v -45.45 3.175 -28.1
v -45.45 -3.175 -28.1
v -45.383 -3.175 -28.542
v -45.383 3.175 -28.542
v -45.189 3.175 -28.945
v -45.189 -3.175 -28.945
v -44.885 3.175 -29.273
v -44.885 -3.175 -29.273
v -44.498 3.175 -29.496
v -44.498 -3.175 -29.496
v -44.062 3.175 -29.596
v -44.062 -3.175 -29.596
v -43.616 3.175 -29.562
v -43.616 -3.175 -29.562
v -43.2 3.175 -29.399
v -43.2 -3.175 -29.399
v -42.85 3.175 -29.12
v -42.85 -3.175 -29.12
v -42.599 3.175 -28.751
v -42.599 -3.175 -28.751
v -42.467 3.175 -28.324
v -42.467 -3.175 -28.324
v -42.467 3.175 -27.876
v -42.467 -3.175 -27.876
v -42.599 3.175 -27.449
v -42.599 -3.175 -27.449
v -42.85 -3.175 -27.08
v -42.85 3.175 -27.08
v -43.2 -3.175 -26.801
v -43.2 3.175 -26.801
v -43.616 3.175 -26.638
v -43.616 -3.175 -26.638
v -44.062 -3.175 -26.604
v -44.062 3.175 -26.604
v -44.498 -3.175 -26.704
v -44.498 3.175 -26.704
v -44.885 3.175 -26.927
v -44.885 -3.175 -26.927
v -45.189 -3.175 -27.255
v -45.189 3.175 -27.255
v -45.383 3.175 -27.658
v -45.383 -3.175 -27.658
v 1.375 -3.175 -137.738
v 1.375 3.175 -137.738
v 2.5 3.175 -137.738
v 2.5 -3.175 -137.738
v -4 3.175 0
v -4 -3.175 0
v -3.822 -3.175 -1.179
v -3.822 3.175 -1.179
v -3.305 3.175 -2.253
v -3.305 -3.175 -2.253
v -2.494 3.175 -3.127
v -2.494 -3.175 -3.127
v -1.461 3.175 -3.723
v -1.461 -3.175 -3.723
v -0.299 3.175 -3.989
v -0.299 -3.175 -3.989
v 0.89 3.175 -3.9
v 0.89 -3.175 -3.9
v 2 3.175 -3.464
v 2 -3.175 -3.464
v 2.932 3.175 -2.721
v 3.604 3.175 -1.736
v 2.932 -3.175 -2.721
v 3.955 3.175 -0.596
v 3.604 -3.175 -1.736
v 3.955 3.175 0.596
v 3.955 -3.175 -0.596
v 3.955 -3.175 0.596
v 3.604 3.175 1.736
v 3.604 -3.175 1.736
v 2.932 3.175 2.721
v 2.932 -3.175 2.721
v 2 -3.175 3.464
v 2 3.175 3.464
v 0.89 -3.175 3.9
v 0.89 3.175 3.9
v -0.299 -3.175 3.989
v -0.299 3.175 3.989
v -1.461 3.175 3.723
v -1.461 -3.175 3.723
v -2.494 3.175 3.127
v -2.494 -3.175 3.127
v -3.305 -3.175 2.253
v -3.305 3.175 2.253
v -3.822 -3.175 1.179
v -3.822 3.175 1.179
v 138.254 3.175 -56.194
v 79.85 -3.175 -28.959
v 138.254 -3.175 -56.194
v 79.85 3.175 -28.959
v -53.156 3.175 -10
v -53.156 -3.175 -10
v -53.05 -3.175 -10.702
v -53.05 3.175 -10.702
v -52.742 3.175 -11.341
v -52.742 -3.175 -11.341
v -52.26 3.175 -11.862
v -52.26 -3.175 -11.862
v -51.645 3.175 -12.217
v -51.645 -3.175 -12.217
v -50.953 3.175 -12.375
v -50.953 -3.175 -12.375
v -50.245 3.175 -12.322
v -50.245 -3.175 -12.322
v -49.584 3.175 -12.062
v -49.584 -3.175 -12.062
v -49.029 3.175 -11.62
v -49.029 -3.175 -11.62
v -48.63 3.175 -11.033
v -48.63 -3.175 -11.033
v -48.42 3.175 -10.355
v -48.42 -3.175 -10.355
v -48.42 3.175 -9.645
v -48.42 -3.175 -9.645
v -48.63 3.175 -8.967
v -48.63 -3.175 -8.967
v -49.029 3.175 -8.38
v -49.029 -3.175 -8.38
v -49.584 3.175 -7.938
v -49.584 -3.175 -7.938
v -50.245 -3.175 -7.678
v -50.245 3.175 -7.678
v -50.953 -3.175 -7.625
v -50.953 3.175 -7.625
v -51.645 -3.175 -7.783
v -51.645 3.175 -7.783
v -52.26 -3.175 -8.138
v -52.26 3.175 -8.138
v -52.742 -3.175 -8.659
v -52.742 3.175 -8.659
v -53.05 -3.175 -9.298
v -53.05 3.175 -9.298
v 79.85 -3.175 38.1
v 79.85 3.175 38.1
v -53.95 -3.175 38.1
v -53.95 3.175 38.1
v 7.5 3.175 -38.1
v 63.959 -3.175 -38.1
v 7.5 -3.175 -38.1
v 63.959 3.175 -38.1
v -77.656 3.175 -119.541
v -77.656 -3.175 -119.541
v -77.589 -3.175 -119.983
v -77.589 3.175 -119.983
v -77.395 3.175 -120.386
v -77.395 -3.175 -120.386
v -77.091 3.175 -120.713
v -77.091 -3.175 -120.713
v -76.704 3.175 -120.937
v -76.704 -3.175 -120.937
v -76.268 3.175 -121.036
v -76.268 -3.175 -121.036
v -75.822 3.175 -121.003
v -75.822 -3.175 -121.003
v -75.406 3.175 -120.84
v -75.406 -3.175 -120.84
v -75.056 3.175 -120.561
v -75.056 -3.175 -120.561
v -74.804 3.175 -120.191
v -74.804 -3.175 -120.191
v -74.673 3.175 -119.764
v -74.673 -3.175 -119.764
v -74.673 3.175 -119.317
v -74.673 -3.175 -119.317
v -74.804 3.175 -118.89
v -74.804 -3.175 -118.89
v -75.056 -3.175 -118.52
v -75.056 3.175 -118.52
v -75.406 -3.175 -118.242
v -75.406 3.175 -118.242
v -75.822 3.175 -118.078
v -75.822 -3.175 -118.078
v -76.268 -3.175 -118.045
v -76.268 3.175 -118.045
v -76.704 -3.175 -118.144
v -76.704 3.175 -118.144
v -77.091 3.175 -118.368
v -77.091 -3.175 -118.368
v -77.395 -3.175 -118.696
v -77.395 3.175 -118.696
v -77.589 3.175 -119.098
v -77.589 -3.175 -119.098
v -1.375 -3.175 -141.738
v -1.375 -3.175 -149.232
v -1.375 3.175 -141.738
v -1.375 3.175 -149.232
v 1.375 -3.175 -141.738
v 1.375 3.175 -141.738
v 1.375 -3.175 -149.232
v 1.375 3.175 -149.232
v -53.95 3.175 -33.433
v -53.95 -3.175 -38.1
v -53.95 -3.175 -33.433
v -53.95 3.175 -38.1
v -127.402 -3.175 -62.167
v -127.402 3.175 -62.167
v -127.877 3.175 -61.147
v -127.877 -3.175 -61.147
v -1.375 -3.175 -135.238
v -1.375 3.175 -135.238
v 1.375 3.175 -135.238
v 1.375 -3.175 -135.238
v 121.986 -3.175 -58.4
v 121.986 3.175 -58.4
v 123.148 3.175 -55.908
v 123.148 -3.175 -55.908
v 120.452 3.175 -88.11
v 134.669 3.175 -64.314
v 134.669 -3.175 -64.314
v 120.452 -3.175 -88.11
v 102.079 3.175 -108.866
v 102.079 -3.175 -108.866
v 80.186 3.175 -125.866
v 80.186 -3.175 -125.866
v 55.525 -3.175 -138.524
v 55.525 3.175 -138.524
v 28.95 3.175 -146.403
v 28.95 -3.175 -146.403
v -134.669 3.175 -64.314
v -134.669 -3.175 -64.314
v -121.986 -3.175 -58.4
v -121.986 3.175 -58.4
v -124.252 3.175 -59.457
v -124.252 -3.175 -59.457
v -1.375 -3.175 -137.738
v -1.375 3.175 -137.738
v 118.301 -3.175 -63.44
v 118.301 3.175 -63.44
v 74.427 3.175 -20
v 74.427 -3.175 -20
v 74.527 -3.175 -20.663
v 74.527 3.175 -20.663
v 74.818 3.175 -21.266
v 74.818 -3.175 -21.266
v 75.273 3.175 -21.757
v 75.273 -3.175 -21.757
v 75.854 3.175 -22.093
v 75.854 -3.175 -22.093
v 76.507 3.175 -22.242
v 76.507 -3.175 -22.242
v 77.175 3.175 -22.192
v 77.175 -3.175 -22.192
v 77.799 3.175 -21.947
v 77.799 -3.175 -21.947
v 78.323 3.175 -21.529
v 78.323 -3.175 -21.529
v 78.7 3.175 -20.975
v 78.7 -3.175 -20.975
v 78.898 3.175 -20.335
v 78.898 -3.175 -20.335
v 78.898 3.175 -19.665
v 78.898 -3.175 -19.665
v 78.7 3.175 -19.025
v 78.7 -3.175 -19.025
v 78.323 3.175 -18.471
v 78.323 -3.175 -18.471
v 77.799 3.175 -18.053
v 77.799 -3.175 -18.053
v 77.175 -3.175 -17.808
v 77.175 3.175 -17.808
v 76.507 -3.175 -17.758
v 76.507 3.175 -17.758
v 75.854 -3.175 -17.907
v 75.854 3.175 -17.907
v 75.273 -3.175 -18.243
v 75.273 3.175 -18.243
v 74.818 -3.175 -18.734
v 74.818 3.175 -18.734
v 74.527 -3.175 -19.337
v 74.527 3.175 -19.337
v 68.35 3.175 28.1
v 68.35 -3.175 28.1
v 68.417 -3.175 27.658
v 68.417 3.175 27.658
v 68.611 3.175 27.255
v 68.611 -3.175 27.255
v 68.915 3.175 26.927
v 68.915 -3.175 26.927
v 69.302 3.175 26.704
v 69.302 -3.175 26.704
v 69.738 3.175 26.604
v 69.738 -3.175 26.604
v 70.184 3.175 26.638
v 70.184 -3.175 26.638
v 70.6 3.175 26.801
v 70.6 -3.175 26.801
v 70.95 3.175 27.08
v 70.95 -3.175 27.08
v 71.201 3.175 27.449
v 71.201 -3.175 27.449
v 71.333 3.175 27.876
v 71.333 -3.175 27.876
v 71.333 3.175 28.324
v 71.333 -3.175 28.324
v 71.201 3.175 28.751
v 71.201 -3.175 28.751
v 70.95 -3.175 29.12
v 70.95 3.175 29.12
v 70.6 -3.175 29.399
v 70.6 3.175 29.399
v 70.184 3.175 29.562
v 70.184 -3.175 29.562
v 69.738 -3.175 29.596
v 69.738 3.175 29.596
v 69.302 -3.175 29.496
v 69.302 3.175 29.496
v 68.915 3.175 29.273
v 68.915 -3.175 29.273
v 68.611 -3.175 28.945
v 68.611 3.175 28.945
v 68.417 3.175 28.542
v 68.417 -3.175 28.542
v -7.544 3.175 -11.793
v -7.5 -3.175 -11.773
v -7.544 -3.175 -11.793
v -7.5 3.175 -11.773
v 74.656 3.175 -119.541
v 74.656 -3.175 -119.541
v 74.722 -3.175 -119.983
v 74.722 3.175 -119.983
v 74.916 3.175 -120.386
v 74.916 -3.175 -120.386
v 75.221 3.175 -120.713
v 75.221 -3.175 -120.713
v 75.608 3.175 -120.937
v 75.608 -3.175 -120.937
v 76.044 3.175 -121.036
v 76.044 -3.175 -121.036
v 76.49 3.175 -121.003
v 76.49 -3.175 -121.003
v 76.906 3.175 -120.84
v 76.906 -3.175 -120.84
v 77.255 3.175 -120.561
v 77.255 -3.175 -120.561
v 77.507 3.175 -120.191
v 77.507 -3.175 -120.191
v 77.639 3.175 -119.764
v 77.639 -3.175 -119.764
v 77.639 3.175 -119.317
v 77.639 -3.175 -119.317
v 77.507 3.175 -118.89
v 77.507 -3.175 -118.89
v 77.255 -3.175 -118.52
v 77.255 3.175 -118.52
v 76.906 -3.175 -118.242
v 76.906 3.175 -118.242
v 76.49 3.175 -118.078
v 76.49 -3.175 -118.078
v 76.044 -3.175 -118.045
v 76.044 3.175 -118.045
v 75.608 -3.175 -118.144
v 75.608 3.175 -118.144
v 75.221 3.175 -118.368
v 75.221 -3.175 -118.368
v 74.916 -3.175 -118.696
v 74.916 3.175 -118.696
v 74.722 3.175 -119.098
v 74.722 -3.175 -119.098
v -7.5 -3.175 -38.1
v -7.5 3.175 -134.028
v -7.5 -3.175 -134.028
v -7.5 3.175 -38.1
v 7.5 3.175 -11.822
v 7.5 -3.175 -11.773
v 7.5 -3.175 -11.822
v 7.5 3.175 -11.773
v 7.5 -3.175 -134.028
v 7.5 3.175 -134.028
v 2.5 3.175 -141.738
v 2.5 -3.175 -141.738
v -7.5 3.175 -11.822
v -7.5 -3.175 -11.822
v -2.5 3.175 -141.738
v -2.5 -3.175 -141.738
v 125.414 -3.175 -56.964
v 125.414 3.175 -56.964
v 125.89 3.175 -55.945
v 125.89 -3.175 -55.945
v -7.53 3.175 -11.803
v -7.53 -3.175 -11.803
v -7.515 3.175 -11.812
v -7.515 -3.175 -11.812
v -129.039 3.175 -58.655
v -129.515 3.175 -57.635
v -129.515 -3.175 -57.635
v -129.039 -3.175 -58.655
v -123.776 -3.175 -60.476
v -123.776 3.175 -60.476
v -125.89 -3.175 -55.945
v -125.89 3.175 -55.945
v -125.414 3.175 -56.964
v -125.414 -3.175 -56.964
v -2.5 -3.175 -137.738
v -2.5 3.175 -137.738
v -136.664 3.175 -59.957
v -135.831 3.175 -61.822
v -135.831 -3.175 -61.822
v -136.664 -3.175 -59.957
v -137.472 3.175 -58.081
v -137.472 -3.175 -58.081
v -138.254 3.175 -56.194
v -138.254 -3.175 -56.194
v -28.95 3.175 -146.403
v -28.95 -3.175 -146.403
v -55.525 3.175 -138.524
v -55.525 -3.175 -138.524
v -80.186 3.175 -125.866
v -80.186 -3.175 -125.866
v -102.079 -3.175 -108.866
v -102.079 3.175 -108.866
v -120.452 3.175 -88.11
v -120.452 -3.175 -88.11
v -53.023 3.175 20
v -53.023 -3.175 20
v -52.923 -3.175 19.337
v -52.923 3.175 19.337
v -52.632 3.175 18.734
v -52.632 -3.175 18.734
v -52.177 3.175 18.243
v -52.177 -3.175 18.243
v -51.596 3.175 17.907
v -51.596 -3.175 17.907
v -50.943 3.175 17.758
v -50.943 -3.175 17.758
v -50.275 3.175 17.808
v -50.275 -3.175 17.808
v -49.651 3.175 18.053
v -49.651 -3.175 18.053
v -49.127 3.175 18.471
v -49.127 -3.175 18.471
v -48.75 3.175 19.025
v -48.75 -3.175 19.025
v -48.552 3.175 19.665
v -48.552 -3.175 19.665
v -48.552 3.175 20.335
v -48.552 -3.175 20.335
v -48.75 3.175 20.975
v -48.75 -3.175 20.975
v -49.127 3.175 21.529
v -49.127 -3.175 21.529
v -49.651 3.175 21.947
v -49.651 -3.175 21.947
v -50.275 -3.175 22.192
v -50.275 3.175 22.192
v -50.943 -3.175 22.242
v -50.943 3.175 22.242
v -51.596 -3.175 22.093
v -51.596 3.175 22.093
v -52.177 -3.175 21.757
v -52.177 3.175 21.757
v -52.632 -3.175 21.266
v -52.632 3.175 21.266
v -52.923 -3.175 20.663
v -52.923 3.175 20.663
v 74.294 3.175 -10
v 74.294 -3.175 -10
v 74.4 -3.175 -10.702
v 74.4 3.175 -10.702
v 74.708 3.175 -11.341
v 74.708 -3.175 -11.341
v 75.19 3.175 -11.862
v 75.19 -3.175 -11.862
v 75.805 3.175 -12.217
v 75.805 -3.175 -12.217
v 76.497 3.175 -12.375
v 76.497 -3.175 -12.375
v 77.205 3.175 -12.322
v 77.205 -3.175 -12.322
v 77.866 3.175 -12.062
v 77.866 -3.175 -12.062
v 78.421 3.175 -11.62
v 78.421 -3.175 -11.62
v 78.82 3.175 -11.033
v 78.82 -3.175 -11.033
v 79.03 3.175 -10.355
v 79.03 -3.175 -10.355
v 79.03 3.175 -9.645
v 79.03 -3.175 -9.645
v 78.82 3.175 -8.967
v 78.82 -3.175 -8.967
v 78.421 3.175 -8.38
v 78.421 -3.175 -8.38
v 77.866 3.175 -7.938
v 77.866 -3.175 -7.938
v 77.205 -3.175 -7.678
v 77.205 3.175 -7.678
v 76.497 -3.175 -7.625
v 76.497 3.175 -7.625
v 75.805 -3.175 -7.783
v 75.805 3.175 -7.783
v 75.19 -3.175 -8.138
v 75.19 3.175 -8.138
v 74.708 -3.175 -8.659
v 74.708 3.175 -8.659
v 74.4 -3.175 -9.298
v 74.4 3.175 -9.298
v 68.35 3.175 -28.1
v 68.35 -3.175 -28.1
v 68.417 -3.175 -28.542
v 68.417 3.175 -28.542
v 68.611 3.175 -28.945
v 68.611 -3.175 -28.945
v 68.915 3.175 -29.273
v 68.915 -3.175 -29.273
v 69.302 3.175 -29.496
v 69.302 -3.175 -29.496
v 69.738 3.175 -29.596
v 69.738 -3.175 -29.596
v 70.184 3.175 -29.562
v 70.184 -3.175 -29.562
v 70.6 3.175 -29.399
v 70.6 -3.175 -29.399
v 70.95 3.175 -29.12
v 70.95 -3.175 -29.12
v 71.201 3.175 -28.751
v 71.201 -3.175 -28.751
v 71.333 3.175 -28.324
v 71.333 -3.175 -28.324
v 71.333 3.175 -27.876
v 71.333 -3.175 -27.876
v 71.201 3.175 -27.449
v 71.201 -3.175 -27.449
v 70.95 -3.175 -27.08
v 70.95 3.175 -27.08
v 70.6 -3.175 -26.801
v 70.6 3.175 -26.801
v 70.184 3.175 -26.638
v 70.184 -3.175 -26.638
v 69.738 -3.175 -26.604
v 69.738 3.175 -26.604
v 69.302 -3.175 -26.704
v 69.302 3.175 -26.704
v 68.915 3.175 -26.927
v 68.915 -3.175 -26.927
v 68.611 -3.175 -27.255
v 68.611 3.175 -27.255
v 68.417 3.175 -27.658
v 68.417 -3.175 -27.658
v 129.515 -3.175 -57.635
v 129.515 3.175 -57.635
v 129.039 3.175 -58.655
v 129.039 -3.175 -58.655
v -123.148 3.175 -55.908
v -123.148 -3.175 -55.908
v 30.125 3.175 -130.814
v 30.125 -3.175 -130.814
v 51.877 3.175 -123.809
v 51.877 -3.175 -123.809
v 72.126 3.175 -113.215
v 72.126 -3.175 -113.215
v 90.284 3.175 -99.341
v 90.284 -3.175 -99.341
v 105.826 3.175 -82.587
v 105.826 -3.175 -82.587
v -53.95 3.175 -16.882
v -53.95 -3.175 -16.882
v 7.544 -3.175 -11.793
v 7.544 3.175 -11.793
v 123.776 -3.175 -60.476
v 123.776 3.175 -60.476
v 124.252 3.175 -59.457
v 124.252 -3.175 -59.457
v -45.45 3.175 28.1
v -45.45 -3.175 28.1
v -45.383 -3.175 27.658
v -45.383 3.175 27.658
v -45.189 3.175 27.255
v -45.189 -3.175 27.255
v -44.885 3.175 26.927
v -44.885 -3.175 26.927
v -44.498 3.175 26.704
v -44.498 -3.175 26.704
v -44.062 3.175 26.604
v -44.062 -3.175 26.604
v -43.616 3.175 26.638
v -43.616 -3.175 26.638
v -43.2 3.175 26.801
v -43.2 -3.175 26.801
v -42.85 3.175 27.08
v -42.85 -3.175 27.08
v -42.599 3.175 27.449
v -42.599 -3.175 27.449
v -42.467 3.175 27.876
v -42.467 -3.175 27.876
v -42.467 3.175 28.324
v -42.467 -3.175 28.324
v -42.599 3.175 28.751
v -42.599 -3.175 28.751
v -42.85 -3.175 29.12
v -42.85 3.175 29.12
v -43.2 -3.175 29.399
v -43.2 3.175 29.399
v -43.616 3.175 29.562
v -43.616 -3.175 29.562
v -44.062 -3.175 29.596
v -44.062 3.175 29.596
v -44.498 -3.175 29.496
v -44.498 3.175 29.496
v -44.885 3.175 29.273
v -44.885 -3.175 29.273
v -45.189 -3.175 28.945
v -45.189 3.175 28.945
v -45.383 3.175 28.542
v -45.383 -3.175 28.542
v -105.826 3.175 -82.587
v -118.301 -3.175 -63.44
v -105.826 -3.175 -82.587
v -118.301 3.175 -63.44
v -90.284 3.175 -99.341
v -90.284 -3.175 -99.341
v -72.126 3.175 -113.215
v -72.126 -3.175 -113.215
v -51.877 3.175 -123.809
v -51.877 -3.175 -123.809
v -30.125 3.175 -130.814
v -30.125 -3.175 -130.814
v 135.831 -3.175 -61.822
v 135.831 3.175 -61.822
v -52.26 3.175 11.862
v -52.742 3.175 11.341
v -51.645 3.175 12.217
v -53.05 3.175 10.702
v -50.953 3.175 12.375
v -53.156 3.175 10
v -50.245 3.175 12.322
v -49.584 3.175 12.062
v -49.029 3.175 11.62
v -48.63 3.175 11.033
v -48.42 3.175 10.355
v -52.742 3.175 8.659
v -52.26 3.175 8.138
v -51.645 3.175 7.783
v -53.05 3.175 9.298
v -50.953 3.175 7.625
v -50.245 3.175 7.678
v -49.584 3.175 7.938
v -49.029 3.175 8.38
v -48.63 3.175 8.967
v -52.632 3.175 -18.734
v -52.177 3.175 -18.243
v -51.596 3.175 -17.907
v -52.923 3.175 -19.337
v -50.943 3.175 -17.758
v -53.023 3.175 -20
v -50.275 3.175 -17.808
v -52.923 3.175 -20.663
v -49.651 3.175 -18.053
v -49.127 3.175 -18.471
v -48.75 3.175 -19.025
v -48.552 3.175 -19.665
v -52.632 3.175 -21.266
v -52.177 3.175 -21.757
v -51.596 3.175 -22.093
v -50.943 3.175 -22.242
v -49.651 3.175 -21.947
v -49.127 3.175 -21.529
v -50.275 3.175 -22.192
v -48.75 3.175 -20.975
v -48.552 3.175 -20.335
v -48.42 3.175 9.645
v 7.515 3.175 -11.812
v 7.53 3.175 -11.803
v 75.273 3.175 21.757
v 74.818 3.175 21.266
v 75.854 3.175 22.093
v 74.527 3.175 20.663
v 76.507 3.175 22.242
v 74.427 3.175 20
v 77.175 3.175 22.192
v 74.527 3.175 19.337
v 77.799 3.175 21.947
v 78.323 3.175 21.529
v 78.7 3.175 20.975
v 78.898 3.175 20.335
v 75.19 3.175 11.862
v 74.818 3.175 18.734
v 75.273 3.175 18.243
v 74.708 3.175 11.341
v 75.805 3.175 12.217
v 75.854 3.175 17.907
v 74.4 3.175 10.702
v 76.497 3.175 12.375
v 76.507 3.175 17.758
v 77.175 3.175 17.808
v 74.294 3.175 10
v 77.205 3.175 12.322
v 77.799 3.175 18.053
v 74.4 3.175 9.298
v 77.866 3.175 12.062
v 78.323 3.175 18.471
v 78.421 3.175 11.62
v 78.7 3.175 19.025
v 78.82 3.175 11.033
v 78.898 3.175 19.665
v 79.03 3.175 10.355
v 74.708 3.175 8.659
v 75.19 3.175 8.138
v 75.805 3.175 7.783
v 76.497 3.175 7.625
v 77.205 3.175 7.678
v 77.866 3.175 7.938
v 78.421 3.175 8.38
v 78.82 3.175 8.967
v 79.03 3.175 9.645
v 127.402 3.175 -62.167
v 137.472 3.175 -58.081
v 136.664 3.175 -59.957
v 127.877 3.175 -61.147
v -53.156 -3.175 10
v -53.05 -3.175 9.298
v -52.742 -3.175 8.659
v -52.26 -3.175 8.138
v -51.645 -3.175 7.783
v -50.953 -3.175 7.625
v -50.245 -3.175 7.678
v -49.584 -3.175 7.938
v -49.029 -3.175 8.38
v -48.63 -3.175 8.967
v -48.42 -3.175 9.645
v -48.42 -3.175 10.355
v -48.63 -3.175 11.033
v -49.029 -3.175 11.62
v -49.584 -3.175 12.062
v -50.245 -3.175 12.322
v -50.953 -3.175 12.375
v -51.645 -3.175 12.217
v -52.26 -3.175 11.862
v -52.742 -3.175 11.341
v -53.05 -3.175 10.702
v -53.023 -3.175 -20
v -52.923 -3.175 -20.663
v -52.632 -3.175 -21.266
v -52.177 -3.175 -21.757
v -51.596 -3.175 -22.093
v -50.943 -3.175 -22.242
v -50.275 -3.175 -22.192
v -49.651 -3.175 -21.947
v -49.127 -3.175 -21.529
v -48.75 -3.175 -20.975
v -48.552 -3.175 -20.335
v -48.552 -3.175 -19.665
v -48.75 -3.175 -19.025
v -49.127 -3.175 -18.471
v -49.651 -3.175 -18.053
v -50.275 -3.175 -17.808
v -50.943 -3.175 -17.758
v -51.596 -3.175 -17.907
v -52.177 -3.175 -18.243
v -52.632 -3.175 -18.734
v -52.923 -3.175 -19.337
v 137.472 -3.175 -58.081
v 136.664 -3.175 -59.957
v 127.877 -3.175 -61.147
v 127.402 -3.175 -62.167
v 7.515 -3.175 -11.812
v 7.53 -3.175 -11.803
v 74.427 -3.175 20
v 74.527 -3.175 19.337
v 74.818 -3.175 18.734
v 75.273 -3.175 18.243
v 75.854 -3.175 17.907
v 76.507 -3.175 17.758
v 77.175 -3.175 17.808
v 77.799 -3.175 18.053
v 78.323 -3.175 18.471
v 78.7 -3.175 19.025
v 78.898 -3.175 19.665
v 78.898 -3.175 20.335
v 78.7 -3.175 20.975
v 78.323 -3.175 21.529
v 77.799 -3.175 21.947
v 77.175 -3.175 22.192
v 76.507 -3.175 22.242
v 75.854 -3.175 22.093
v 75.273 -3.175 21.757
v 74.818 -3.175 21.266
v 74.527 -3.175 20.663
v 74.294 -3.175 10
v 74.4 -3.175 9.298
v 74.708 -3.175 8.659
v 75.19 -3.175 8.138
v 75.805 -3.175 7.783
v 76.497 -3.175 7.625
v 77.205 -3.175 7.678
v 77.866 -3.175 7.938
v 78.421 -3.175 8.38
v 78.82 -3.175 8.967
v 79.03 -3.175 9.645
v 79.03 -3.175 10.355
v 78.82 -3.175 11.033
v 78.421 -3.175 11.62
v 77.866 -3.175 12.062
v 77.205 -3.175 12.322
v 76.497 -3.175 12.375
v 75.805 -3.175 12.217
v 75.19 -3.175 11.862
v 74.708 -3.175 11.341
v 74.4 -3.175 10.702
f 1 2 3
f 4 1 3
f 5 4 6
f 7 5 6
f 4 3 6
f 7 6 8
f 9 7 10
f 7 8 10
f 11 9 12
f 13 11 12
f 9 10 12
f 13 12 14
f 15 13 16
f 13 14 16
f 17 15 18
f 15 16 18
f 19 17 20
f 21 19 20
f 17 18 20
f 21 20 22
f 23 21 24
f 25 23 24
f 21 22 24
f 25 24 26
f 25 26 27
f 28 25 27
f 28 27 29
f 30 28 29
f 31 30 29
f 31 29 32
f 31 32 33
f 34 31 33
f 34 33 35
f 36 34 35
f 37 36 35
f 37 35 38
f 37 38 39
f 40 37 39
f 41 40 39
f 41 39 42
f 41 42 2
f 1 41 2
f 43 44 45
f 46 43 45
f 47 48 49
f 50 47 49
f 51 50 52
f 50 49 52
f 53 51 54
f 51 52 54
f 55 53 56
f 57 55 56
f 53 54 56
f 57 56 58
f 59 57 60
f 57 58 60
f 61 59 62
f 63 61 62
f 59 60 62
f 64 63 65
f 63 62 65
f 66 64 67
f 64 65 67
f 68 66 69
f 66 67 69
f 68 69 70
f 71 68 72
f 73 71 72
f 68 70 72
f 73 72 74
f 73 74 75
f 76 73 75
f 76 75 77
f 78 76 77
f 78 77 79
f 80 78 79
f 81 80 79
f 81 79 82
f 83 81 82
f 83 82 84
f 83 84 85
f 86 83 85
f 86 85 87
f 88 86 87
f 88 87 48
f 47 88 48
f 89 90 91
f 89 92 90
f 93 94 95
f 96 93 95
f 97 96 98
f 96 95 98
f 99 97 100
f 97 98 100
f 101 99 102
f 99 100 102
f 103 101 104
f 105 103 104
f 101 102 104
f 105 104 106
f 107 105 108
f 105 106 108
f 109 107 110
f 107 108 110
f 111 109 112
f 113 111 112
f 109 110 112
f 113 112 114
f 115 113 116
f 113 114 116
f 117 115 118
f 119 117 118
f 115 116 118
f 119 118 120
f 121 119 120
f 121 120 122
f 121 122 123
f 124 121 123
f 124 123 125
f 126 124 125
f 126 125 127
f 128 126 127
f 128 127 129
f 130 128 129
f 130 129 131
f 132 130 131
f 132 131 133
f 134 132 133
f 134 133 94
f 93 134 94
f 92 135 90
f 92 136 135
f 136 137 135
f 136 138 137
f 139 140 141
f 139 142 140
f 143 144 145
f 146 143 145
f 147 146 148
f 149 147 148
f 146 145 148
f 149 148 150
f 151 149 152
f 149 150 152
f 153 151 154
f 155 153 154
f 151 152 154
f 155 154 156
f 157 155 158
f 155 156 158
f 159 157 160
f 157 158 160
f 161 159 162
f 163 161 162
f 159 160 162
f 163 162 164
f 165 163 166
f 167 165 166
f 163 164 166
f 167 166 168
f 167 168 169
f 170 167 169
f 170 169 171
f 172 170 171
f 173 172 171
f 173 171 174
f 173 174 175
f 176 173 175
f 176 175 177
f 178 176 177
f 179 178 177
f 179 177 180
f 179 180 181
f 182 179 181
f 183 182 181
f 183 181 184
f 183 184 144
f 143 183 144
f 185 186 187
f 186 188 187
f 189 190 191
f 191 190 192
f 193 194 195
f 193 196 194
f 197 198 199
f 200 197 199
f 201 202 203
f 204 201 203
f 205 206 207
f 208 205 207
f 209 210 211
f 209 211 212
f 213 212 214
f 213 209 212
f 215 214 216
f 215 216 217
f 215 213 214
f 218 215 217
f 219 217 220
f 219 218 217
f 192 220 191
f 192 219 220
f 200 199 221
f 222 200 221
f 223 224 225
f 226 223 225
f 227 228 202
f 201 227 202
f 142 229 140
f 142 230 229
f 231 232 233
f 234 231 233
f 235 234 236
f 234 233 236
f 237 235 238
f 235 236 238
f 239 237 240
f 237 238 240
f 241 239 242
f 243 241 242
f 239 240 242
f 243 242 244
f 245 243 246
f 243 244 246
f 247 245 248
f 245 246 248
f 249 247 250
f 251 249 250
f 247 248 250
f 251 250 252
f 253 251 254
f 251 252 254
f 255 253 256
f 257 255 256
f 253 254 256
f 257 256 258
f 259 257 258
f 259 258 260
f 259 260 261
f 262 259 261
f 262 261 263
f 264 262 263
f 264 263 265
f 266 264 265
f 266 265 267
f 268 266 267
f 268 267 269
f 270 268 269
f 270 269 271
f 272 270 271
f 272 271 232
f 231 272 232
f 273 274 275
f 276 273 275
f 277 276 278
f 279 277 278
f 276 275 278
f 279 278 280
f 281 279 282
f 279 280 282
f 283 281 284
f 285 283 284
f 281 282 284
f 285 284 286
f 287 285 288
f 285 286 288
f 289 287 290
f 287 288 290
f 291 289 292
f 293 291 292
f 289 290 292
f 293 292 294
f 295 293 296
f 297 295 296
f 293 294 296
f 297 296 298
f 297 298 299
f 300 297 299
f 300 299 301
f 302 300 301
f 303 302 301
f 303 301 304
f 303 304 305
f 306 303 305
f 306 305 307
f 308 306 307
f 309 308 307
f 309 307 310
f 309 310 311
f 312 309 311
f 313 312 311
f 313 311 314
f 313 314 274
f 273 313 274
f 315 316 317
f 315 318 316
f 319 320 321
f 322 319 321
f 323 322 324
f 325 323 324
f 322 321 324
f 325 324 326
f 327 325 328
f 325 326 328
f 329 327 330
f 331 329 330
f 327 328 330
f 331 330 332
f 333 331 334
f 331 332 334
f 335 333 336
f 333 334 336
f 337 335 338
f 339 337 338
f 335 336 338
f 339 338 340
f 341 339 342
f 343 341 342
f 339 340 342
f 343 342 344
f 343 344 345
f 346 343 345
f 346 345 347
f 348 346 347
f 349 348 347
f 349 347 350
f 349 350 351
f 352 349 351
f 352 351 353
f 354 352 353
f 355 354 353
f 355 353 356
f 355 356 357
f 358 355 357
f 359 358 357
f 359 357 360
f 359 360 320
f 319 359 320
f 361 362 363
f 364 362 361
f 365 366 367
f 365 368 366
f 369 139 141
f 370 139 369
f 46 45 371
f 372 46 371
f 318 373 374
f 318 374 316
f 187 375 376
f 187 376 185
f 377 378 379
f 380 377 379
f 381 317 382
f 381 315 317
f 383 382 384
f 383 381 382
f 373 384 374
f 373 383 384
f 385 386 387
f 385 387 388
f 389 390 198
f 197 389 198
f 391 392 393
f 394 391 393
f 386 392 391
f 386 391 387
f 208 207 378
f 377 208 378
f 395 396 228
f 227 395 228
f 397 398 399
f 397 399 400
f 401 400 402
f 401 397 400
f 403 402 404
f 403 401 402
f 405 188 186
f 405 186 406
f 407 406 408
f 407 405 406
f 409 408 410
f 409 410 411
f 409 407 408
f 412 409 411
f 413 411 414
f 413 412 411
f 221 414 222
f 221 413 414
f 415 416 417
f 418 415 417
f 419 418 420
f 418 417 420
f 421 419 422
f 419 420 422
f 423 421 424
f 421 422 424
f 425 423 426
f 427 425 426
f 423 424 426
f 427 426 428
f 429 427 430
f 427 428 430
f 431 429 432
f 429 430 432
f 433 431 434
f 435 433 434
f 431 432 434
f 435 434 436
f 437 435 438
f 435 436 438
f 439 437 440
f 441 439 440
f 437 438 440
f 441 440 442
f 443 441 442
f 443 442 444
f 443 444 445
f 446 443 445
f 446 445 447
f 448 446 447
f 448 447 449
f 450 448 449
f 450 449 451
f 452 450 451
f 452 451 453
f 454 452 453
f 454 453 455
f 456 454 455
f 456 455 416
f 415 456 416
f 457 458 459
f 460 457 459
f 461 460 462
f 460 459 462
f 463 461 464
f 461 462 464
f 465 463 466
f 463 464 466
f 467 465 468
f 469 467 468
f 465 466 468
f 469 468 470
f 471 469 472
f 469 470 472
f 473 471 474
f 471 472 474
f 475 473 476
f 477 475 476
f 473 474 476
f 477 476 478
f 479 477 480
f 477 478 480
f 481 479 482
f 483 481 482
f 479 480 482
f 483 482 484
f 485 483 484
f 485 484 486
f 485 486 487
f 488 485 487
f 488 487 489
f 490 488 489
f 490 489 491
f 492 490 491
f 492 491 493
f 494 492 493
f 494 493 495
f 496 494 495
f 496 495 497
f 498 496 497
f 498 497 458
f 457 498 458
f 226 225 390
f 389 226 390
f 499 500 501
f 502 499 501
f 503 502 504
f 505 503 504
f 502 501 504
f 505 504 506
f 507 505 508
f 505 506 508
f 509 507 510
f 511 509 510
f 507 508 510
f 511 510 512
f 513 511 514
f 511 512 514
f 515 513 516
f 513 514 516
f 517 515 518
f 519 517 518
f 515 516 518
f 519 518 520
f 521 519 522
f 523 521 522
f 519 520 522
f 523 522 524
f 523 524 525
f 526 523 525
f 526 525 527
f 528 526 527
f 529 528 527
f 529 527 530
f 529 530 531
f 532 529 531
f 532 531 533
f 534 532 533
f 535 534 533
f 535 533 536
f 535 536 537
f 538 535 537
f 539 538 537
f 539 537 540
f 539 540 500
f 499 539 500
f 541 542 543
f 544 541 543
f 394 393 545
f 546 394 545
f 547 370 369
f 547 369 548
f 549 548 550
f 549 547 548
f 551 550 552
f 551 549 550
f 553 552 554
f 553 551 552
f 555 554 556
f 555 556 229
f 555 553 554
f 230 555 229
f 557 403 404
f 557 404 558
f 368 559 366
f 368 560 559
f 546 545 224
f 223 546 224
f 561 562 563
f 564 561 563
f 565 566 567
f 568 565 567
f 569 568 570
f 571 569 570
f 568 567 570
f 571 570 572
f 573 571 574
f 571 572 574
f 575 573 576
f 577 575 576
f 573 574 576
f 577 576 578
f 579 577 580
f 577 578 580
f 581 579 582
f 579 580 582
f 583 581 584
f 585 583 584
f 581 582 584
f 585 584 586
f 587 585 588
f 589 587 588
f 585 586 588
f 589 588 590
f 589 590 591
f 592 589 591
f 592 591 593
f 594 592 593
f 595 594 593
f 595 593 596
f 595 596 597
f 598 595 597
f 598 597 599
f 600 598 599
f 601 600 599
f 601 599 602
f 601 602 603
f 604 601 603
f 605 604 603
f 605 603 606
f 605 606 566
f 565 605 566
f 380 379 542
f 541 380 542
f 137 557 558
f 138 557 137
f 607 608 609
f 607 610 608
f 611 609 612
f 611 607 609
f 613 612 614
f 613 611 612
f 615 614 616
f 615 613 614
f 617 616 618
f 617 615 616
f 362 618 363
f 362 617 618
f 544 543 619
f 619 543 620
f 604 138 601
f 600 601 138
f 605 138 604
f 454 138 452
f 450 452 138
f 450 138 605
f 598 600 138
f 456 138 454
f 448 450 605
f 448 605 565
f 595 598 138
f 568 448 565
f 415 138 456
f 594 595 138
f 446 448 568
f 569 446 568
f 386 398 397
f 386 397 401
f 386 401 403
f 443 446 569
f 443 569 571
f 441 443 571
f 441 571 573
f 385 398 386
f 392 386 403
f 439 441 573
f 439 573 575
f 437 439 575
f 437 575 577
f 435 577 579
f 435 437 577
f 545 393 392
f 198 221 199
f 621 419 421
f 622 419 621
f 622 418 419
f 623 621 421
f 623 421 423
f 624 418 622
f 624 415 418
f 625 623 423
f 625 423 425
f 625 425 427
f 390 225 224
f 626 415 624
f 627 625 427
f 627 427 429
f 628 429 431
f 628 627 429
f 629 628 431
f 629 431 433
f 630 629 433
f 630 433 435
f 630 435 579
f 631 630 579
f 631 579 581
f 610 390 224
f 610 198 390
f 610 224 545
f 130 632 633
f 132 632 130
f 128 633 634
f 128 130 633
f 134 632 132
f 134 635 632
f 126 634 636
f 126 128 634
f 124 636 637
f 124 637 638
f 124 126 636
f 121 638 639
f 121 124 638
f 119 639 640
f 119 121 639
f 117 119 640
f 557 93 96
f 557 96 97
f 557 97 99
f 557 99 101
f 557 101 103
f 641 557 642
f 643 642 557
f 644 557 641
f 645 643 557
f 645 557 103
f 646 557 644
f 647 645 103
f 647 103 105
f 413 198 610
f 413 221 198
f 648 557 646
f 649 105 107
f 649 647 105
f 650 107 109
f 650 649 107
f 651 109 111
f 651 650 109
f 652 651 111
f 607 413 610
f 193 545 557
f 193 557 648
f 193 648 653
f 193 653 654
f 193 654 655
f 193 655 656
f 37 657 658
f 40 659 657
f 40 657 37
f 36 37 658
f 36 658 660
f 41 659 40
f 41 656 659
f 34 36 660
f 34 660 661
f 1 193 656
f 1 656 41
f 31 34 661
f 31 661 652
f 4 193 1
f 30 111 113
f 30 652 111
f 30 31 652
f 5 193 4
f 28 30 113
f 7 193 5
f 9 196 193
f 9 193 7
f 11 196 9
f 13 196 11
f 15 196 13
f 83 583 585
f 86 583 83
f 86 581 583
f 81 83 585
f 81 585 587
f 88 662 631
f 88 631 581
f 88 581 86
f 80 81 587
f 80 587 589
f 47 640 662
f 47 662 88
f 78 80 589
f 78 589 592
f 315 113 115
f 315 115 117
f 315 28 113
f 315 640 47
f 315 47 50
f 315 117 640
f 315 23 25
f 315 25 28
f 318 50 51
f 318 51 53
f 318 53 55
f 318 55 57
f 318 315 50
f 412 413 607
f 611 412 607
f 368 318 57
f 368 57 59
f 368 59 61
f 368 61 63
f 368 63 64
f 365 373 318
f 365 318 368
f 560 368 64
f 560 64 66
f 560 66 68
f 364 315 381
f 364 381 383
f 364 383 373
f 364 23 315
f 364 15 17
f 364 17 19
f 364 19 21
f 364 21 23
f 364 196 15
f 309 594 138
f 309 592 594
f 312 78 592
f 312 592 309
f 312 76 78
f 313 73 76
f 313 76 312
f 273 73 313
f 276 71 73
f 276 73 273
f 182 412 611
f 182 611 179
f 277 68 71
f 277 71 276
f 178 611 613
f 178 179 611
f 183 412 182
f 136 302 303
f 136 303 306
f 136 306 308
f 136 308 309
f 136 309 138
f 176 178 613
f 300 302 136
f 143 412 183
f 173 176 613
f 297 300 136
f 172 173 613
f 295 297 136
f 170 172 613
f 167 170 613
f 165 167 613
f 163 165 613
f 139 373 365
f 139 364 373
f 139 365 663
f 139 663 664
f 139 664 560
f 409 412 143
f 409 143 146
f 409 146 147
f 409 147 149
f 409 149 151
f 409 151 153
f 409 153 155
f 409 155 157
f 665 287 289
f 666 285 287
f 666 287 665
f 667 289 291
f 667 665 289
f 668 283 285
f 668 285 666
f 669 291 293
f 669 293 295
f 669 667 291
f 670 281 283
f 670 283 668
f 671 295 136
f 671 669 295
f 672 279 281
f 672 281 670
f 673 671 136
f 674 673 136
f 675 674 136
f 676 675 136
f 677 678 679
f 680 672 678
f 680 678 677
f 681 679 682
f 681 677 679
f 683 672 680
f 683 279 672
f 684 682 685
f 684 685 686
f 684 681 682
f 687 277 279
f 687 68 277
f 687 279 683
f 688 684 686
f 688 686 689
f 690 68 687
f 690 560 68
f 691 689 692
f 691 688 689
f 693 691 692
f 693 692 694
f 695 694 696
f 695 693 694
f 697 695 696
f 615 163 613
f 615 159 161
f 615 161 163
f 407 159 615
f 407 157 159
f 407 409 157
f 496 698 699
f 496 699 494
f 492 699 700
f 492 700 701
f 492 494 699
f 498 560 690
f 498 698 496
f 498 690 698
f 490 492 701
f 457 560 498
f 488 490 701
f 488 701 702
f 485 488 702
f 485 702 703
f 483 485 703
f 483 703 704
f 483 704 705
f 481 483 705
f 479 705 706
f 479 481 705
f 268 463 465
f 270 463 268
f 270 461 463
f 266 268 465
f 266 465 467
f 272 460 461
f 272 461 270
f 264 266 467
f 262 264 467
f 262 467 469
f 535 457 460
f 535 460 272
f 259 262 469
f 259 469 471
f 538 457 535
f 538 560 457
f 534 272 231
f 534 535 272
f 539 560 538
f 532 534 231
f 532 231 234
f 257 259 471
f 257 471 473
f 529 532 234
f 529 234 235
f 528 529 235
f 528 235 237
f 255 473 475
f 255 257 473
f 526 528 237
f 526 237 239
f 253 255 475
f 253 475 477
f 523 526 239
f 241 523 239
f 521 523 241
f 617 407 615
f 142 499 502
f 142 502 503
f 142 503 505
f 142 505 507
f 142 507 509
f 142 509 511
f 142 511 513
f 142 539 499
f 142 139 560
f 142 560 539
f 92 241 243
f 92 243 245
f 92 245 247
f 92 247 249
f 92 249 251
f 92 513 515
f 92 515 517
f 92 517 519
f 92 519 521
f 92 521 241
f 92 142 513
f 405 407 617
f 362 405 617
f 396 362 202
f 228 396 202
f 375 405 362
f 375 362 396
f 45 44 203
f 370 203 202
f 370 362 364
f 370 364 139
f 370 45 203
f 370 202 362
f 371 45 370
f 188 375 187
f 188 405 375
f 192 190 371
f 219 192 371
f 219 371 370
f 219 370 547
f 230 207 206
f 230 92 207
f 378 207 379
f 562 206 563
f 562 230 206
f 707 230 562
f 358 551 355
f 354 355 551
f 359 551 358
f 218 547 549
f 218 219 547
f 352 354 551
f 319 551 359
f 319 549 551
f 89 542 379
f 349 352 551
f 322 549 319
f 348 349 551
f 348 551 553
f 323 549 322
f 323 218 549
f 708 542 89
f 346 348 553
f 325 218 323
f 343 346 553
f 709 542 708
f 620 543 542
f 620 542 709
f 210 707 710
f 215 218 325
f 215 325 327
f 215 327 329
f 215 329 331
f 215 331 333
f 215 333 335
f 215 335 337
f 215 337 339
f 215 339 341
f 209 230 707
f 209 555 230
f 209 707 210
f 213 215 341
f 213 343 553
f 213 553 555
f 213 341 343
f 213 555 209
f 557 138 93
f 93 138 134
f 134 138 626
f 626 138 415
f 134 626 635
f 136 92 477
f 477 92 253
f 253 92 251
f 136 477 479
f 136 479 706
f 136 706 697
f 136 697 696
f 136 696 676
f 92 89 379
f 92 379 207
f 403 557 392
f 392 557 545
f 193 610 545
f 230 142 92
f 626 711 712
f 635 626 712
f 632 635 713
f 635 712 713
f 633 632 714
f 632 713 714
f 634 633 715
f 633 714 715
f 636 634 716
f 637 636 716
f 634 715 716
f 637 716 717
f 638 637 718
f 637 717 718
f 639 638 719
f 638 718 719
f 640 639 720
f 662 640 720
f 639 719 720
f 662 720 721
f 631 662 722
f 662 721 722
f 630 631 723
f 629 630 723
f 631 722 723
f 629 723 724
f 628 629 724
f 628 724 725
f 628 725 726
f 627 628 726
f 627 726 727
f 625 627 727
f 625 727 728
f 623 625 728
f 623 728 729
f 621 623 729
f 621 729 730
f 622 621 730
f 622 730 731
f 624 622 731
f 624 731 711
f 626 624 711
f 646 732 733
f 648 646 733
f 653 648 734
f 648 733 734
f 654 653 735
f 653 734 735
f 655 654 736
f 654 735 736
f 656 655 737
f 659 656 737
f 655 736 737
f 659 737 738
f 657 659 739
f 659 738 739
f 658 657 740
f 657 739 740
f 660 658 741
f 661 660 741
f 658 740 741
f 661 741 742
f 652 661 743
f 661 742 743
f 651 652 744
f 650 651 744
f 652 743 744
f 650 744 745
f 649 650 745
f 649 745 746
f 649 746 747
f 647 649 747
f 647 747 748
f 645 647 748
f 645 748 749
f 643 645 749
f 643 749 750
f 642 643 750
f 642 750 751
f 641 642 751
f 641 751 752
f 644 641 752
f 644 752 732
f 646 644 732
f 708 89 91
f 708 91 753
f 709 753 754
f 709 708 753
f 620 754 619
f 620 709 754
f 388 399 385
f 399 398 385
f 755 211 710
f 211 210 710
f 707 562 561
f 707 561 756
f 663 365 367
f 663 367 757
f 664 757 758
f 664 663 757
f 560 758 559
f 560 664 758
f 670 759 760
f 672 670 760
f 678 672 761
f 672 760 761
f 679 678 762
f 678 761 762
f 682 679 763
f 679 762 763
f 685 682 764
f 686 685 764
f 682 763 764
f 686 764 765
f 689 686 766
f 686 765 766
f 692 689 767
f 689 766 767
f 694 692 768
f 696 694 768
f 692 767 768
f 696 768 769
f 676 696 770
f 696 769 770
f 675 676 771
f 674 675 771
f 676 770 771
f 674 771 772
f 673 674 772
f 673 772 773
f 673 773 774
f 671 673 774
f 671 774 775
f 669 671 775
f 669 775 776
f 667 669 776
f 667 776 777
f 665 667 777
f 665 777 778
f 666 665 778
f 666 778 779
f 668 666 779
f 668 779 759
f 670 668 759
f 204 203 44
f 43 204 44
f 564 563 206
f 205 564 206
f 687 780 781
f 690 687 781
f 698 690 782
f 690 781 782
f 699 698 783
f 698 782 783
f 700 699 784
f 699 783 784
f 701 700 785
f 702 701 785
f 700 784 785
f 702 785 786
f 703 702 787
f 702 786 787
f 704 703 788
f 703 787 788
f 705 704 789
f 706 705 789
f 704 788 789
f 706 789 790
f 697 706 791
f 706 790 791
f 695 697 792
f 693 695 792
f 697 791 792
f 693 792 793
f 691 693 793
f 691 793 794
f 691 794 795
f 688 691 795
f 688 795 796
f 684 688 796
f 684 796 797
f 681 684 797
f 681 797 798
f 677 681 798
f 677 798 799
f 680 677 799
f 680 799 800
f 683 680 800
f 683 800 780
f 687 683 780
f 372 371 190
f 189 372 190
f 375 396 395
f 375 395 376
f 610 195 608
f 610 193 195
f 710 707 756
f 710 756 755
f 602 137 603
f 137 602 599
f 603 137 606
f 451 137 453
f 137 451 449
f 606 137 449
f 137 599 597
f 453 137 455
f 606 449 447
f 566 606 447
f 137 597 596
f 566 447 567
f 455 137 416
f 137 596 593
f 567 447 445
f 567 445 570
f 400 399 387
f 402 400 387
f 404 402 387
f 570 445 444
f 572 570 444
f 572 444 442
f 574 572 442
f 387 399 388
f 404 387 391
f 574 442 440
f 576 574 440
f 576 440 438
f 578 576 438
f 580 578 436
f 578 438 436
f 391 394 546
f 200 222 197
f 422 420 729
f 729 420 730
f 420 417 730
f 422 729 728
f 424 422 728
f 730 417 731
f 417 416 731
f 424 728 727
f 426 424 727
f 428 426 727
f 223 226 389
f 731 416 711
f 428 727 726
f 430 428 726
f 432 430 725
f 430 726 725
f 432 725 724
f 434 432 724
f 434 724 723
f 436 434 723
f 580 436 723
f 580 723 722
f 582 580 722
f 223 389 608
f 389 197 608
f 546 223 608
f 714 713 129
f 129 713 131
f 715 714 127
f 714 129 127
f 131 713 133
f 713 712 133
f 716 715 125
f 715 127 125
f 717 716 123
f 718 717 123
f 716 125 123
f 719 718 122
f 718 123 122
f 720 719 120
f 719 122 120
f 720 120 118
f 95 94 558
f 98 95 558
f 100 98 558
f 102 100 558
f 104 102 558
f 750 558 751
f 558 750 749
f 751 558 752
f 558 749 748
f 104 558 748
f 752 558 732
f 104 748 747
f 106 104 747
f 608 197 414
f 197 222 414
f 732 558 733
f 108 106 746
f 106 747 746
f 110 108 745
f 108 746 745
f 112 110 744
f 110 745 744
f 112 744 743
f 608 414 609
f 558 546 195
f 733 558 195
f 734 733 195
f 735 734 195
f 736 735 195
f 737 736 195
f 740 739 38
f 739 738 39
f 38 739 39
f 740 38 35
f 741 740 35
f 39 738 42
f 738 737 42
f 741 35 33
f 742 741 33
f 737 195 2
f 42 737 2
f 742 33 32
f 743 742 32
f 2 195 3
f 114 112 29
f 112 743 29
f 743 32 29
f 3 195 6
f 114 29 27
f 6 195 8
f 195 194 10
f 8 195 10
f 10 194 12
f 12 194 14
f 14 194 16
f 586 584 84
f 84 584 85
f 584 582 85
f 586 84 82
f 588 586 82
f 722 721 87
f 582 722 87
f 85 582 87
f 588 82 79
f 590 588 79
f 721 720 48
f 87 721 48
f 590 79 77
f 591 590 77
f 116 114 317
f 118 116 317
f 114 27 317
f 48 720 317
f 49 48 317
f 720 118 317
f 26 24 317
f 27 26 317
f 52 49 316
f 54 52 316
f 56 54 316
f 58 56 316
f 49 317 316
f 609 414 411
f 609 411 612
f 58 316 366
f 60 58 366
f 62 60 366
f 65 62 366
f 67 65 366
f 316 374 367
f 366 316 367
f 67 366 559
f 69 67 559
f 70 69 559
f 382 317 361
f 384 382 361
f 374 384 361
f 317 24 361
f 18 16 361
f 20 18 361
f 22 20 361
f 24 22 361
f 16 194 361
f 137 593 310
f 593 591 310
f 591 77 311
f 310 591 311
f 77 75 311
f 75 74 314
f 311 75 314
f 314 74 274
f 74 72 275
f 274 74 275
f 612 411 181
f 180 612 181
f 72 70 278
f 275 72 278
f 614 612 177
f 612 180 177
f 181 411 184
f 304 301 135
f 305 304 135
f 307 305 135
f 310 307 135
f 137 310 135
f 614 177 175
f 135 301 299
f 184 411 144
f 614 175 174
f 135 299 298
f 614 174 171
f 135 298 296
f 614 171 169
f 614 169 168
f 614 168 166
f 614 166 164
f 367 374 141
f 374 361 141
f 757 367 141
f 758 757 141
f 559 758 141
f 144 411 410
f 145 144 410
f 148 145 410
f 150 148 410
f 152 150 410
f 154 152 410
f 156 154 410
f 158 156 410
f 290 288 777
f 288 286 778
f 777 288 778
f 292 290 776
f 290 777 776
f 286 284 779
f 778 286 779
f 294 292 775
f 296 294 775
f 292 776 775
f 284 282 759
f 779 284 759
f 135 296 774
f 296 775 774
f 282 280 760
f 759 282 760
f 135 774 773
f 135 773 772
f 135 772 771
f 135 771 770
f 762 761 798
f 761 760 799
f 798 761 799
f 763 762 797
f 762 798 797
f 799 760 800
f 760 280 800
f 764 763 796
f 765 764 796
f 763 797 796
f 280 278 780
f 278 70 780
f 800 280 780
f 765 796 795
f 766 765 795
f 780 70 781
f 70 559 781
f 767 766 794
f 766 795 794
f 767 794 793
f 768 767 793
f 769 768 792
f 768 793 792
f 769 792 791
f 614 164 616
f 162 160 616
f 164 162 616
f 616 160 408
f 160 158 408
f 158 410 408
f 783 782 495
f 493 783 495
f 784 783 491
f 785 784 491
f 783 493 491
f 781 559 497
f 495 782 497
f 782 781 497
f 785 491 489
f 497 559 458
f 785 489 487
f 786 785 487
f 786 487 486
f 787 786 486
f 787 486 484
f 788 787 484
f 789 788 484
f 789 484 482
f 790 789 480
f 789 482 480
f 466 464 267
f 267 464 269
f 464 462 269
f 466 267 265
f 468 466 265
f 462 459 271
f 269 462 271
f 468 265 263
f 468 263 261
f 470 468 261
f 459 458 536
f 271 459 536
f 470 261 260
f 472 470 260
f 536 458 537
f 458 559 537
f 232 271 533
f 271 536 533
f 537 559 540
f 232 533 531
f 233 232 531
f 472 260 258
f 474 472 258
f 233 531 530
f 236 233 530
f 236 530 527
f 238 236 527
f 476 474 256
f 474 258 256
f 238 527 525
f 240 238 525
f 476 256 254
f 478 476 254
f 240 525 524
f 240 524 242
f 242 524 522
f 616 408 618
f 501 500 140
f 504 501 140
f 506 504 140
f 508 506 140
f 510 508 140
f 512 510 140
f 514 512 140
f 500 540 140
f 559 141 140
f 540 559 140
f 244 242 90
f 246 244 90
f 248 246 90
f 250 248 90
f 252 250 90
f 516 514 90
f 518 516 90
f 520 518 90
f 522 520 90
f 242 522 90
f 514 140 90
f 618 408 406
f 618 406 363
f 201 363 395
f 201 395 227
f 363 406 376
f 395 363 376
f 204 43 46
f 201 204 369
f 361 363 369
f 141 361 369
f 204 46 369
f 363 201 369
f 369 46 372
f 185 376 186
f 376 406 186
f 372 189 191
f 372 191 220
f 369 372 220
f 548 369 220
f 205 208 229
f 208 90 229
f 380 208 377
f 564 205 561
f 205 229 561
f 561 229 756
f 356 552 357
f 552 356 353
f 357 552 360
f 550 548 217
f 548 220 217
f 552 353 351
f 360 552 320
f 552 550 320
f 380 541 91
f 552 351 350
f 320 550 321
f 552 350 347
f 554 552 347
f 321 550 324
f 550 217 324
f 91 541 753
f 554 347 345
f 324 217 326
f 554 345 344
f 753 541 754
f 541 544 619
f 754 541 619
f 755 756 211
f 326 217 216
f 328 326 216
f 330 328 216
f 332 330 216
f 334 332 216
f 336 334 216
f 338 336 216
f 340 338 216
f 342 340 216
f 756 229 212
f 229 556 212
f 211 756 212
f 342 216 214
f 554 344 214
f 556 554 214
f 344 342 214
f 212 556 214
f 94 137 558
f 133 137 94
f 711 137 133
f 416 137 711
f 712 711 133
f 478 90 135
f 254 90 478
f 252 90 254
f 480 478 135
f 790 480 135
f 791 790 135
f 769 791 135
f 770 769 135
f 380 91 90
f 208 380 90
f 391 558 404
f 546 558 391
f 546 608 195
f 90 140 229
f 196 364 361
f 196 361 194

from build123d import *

# Parameters (mm, degrees)
BOSS_EXTRUDE1_DEPTH             = 3.175
SKETCH2_W                       = 2.75
SKETCH2_H                       = 2.5
SKETCH2_H_2                     = 4
SKETCH2_W_2                     = 1.125
SKETCH2_H_3                     = 7.5
CUT_EXTRUDE1_DEPTH              = 204.460831631
CIRPATTERN1_COUNT               = 2
CIRPATTERN1_ANGLE               = 65
CIRPATTERN1_THE_OTHER_WAY_COUNT = 2
CIRPATTERN1_THE_OTHER_WAY_ANGLE = 65
F_3_0_3_DIAMETER_HOLE1_D        = 3
F_8_0_8_DIAMETER_HOLE1_D        = 8
F_8_0_8_DIAMETER_HOLE1_DEPTH    = 6.35
F_8_CLEARANCE_HOLE1_D           = 4.4958
F_8_CLEARANCE_HOLE1_DEPTH       = 12.83
F_8_CLEARANCE_HOLE1_TIP         = 1.350674586
F_3_16_0_1875_DOWEL_HOLE1_D     = 4.7625
F_3_16_0_1875_DOWEL_HOLE1_DEPTH = 12.83
F_3_16_0_1875_DOWEL_HOLE1_TIP   = 1.430799349


with BuildPart() as part:
    # Sketch1 → Boss-Extrude1 (new, symmetric)
    with BuildSketch(Plane(origin=(0, 0, 0), x_dir=(1, 0, 0), z_dir=(0, 1, 0))):
        with BuildLine():
            Line((79.85, 28.959332111), (138.254290129, 56.193699868))
            ThreePointArc((138.254290129, 56.193699868), (0, 149.238), (-138.254290129, 56.193699868))
            Line((-138.254290129, 56.193699868), (-53.95, 16.881963765))
            Line((-53.95, 16.881963765), (-53.95, -38.1))
            Line((-53.95, -38.1), (79.85, -38.1))
            Line((79.85, -38.1), (79.85, 28.959332111))
        make_face()
        with BuildLine():
            Line((-7.5, 11.821590418), (-7.5, 11.772641828))
            Line((-7.5, 11.772641828), (-7.544362488, 11.793328396))
            ThreePointArc((-7.544362488, 11.793328396), (-7.522194517, 11.807480241), (-7.5, 11.821590418))
        make_face(mode=Mode.SUBTRACT)
        with BuildLine():
            ThreePointArc((7.5, 11.821590418), (7.522194517, 11.807480241), (7.544362488, 11.793328396))
            Line((7.544362488, 11.793328396), (7.5, 11.772641828))
            Line((7.5, 11.772641828), (7.5, 11.821590418))
        make_face(mode=Mode.SUBTRACT)
        with BuildLine():
            Line((-7.5, 134.028320306), (-7.5, 38.1))
            Line((-7.5, 38.1), (-53.95, 38.1))
            Line((-53.95, 38.1), (-53.95, 33.43263255))
            Line((-53.95, 33.43263255), (-118.301273414, 63.440124154))
            ThreePointArc((-118.301273414, 63.440124154), (-72.126024825, 113.215180903), (-7.5, 134.028320306))
        make_face(mode=Mode.SUBTRACT)
        with BuildLine():
            ThreePointArc((7.5, 134.028320306), (72.126024825, 113.215180903), (118.301273414, 63.440124154))
            Line((118.301273414, 63.440124154), (63.959201798, 38.1))
            Line((63.959201798, 38.1), (7.5, 38.1))
            Line((7.5, 38.1), (7.5, 134.028320306))
        make_face(mode=Mode.SUBTRACT)
    extrude(amount=BOSS_EXTRUDE1_DEPTH, both=True)

    # Sketch2 → Cut-Extrude1 (cut, symmetric)
    with BuildSketch(Plane(origin=(0, 0, 0), x_dir=(1, 0, 0), z_dir=(0, 1, 0))):
        with Locations((0, 136.488)):
            Rectangle(SKETCH2_W, SKETCH2_H)
        with Locations((0, 139.738)):
            Rectangle(SKETCH2_W, SKETCH2_H_2)
        with Locations((1.9375, 139.738)):
            Rectangle(SKETCH2_W_2, SKETCH2_H_2)
        with Locations((0, 145.488)):
            Rectangle(SKETCH2_W, SKETCH2_H_3)
        with Locations((-1.9375, 139.738)):
            Rectangle(SKETCH2_W_2, SKETCH2_H_2)
    cut_extrude1 = extrude(amount=CUT_EXTRUDE1_DEPTH, both=True, mode=Mode.SUBTRACT)

    # CirPattern1: Cut-Extrude1 ×2 about axis
    cirpattern1_axis = Axis((0, 0, 0), (0, 1, 0))
    for i in range(1, CIRPATTERN1_COUNT):
        add(cut_extrude1.rotate(cirpattern1_axis, i * CIRPATTERN1_ANGLE / (CIRPATTERN1_COUNT - 1)), mode=Mode.SUBTRACT)

    # CirPattern1 the other way: Cut-Extrude1 ×2 about axis
    cirpattern1_the_other_way_axis = Axis((0, 0, 0), (0, -1, 0))
    for i in range(1, CIRPATTERN1_THE_OTHER_WAY_COUNT):
        add(cut_extrude1.rotate(cirpattern1_the_other_way_axis, i * CIRPATTERN1_THE_OTHER_WAY_ANGLE / (CIRPATTERN1_THE_OTHER_WAY_COUNT - 1)), mode=Mode.SUBTRACT)

    # Ø3.0 (3) Diameter Hole1 (through all)
    with Locations(Plane(origin=(0, 3.175, 0), x_dir=(1, 0, 0), z_dir=(0, 1, 0))):
        with Locations((0, 0), (-76.155771888, 119.540616747), (76.155771888, 119.540616747), (69.85, 28.1), (69.85, -28.1), (-43.95, -28.1), (-43.95, 28.1)):
            Hole(F_3_0_3_DIAMETER_HOLE1_D / 2)

    # Ø8.0 (8) Diameter Hole1
    with Locations(Plane(origin=(0, 3.175, 0), x_dir=(1, 0, 0), z_dir=(0, 1, 0))):
        with Locations((0, 0)):
            Hole(F_8_0_8_DIAMETER_HOLE1_D / 2, depth=F_8_0_8_DIAMETER_HOLE1_DEPTH)

    # #8 Clearance Hole1
    with Locations(Plane(origin=(0, 3.175, 0), x_dir=(1, 0, 0), z_dir=(0, 1, 0))):
        with Locations((-50.775, -20), (-50.775, 20), (76.675, -20), (76.675, 20)):
            Hole(F_8_CLEARANCE_HOLE1_D / 2, depth=F_8_CLEARANCE_HOLE1_DEPTH)
            with Locations((0, 0, -(F_8_CLEARANCE_HOLE1_DEPTH + F_8_CLEARANCE_HOLE1_TIP / 2))):  # 118° drill point
                Cone(0, F_8_CLEARANCE_HOLE1_D / 2, F_8_CLEARANCE_HOLE1_TIP, mode=Mode.SUBTRACT)

    # 3/16 (0.1875) Dowel Hole1
    with Locations(Plane(origin=(0, 3.175, 0), x_dir=(1, 0, 0), z_dir=(0, 1, 0))):
        with Locations((-50.775, -10), (-50.775, 10), (76.675, -10), (76.675, 10)):
            Hole(F_3_16_0_1875_DOWEL_HOLE1_D / 2, depth=F_3_16_0_1875_DOWEL_HOLE1_DEPTH)
            with Locations((0, 0, -(F_3_16_0_1875_DOWEL_HOLE1_DEPTH + F_3_16_0_1875_DOWEL_HOLE1_TIP / 2))):  # 118° drill point
                Cone(0, F_3_16_0_1875_DOWEL_HOLE1_D / 2, F_3_16_0_1875_DOWEL_HOLE1_TIP, mode=Mode.SUBTRACT)


solid = part.part
